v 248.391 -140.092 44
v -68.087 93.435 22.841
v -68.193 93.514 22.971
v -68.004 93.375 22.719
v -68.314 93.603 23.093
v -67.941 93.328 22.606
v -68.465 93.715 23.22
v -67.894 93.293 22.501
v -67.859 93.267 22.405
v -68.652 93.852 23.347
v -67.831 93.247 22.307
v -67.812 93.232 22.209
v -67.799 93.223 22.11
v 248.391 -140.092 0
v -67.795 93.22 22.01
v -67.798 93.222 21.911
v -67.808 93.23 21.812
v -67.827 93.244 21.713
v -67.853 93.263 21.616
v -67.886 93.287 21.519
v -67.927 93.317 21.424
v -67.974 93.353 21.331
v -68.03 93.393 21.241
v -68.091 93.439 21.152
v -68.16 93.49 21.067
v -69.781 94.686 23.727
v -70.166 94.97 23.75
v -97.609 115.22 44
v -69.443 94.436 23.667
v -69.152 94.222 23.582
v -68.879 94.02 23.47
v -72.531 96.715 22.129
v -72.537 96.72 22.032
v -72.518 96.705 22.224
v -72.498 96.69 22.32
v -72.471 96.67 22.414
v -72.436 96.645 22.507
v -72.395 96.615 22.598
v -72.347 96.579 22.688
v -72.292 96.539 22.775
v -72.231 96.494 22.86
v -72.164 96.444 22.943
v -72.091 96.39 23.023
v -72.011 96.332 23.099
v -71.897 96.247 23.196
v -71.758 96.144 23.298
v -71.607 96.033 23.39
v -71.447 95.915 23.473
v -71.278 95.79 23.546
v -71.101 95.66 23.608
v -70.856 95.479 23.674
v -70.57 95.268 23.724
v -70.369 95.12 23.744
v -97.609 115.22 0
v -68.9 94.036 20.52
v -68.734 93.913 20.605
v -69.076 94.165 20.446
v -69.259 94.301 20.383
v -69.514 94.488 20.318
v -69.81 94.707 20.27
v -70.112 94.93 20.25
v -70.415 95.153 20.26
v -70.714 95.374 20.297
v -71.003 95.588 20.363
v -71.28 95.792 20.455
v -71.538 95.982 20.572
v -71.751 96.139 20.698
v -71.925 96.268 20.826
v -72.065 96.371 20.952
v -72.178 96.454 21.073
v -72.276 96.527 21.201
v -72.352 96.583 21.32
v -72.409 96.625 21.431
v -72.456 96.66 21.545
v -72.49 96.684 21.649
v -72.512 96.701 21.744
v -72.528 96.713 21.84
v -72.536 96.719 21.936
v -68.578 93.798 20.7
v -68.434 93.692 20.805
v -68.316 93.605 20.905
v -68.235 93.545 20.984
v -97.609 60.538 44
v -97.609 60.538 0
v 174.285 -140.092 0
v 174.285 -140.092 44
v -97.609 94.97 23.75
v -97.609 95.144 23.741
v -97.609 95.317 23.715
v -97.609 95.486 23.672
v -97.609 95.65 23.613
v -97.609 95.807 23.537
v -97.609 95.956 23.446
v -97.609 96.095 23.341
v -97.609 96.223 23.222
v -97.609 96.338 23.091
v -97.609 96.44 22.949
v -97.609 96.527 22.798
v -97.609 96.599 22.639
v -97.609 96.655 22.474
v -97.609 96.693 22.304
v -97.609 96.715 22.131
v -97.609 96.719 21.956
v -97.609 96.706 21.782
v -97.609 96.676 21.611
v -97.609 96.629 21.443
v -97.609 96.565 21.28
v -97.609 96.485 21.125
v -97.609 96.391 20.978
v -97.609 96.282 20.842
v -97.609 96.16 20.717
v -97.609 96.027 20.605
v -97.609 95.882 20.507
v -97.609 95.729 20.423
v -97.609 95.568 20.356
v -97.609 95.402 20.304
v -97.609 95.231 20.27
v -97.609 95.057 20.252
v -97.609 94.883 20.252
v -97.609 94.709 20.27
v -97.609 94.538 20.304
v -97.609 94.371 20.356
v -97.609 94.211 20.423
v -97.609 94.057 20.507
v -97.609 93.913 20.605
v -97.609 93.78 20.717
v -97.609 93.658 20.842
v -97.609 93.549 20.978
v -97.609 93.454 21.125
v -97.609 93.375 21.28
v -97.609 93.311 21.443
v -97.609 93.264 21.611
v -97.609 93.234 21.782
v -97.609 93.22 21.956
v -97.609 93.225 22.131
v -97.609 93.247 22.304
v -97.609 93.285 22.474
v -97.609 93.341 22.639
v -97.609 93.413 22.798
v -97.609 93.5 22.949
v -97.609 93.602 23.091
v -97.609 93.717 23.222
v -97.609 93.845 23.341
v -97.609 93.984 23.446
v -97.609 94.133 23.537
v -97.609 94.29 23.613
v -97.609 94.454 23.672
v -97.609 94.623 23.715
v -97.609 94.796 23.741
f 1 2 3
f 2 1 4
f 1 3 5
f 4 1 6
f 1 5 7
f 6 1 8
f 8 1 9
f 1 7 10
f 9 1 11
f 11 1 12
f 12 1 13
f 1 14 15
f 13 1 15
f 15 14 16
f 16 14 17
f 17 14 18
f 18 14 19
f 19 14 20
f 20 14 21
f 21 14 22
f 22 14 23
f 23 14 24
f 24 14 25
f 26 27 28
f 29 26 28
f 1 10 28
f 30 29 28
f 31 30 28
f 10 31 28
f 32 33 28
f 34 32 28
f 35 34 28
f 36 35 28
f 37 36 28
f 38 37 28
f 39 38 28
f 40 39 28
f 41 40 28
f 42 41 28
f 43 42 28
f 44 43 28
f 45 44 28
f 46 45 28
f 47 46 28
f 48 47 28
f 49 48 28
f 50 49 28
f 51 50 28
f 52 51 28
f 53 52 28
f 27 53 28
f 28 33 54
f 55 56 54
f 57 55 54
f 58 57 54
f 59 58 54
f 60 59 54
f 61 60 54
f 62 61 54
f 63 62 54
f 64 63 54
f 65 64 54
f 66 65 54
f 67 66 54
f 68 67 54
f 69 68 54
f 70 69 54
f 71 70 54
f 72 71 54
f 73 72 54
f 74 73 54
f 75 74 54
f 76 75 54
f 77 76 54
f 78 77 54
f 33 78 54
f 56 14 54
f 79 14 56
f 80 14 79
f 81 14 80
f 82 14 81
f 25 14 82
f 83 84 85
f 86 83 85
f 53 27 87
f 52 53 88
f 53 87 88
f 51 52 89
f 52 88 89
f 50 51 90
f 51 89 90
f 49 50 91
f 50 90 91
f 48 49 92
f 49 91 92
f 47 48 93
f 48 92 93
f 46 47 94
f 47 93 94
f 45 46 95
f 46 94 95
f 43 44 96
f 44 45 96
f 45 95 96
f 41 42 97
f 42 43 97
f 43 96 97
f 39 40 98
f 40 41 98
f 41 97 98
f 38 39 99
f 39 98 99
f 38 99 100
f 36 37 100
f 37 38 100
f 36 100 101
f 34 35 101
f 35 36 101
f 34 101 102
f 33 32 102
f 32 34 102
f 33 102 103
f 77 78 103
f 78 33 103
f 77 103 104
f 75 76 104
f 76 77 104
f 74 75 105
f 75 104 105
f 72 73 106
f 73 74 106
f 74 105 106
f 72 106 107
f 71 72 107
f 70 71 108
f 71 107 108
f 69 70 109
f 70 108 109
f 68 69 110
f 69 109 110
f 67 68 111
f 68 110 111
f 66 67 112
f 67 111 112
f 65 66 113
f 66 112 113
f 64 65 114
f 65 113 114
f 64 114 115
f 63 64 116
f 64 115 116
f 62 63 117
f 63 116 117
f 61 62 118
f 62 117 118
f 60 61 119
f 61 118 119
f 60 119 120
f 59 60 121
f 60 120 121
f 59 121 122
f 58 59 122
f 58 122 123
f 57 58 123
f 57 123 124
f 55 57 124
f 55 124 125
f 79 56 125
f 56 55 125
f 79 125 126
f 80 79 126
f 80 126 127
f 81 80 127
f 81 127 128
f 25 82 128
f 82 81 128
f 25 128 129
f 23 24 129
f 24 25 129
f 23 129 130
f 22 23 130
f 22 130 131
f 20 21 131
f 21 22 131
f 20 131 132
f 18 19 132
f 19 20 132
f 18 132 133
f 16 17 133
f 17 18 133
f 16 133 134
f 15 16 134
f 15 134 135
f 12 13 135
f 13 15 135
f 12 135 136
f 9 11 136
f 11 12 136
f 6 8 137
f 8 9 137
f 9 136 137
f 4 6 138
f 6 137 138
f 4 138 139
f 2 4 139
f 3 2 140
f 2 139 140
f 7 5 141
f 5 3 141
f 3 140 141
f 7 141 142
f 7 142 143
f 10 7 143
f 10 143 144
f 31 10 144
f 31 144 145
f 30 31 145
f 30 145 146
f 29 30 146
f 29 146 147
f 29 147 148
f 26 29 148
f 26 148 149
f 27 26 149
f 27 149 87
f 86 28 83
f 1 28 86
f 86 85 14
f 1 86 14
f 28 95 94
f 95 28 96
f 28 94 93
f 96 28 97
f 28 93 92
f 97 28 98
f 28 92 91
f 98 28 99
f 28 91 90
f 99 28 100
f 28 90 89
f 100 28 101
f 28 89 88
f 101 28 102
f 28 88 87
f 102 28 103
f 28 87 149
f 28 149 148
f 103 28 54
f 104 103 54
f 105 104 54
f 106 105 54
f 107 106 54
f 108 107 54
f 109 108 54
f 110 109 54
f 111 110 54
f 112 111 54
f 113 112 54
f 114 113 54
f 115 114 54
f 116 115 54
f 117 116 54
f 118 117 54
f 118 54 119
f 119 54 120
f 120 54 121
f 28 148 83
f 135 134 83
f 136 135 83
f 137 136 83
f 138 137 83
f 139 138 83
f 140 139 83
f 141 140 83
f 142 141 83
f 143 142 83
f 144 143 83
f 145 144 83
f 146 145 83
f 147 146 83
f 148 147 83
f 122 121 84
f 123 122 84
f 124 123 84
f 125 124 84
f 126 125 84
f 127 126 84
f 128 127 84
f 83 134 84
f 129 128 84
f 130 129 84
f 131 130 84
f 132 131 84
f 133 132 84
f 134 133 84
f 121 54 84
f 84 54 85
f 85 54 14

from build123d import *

# Parameters (mm, degrees)
BOSS_EXTRU_1_DEPTH      = 44
ENL_V_MAT_EXTRU_1_REACH = 348
ESQUISSE2_R             = 1.75


with BuildPart() as part:
    # Esquisse1 → Boss.-Extru.1 (new body)
    with BuildSketch(Plane.XY):
        Polygon((-97.60917289, 115.219928183), (-97.60917289, 60.537847258), (174.28529528, -140.091646173), (248.39082711, -140.091646173), align=None)
    extrude(amount=BOSS_EXTRU_1_DEPTH)

    # Enlèv. mat.-Extru.1: up to this face of the body (flat: up to its plane)
    enl_v_mat_extru_1_end = Plane(part.part.faces().sort_by_distance((75.39082711, -12.435858995, 22))[0])
    # Esquisse2 → Enlèv. mat.-Extru.1 (cut, up to the picked face)
    with BuildSketch(Plane.ZY.offset(97.60917289), mode=Mode.PRIVATE) as enl_v_mat_extru_1_sk1:
        with Locations((22, 94.969928183)):
            Circle(ESQUISSE2_R)
    enl_v_mat_extru_1_tool1 = split(extrude(enl_v_mat_extru_1_sk1.sketch, amount=-ENL_V_MAT_EXTRU_1_REACH, mode=Mode.PRIVATE), bisect_by=enl_v_mat_extru_1_end, keep=Keep.BOTH, mode=Mode.PRIVATE)
    add(enl_v_mat_extru_1_tool1.solids().sort_by_distance((-97.609173, 94.969928, 22))[0], mode=Mode.SUBTRACT)


solid = part.part
